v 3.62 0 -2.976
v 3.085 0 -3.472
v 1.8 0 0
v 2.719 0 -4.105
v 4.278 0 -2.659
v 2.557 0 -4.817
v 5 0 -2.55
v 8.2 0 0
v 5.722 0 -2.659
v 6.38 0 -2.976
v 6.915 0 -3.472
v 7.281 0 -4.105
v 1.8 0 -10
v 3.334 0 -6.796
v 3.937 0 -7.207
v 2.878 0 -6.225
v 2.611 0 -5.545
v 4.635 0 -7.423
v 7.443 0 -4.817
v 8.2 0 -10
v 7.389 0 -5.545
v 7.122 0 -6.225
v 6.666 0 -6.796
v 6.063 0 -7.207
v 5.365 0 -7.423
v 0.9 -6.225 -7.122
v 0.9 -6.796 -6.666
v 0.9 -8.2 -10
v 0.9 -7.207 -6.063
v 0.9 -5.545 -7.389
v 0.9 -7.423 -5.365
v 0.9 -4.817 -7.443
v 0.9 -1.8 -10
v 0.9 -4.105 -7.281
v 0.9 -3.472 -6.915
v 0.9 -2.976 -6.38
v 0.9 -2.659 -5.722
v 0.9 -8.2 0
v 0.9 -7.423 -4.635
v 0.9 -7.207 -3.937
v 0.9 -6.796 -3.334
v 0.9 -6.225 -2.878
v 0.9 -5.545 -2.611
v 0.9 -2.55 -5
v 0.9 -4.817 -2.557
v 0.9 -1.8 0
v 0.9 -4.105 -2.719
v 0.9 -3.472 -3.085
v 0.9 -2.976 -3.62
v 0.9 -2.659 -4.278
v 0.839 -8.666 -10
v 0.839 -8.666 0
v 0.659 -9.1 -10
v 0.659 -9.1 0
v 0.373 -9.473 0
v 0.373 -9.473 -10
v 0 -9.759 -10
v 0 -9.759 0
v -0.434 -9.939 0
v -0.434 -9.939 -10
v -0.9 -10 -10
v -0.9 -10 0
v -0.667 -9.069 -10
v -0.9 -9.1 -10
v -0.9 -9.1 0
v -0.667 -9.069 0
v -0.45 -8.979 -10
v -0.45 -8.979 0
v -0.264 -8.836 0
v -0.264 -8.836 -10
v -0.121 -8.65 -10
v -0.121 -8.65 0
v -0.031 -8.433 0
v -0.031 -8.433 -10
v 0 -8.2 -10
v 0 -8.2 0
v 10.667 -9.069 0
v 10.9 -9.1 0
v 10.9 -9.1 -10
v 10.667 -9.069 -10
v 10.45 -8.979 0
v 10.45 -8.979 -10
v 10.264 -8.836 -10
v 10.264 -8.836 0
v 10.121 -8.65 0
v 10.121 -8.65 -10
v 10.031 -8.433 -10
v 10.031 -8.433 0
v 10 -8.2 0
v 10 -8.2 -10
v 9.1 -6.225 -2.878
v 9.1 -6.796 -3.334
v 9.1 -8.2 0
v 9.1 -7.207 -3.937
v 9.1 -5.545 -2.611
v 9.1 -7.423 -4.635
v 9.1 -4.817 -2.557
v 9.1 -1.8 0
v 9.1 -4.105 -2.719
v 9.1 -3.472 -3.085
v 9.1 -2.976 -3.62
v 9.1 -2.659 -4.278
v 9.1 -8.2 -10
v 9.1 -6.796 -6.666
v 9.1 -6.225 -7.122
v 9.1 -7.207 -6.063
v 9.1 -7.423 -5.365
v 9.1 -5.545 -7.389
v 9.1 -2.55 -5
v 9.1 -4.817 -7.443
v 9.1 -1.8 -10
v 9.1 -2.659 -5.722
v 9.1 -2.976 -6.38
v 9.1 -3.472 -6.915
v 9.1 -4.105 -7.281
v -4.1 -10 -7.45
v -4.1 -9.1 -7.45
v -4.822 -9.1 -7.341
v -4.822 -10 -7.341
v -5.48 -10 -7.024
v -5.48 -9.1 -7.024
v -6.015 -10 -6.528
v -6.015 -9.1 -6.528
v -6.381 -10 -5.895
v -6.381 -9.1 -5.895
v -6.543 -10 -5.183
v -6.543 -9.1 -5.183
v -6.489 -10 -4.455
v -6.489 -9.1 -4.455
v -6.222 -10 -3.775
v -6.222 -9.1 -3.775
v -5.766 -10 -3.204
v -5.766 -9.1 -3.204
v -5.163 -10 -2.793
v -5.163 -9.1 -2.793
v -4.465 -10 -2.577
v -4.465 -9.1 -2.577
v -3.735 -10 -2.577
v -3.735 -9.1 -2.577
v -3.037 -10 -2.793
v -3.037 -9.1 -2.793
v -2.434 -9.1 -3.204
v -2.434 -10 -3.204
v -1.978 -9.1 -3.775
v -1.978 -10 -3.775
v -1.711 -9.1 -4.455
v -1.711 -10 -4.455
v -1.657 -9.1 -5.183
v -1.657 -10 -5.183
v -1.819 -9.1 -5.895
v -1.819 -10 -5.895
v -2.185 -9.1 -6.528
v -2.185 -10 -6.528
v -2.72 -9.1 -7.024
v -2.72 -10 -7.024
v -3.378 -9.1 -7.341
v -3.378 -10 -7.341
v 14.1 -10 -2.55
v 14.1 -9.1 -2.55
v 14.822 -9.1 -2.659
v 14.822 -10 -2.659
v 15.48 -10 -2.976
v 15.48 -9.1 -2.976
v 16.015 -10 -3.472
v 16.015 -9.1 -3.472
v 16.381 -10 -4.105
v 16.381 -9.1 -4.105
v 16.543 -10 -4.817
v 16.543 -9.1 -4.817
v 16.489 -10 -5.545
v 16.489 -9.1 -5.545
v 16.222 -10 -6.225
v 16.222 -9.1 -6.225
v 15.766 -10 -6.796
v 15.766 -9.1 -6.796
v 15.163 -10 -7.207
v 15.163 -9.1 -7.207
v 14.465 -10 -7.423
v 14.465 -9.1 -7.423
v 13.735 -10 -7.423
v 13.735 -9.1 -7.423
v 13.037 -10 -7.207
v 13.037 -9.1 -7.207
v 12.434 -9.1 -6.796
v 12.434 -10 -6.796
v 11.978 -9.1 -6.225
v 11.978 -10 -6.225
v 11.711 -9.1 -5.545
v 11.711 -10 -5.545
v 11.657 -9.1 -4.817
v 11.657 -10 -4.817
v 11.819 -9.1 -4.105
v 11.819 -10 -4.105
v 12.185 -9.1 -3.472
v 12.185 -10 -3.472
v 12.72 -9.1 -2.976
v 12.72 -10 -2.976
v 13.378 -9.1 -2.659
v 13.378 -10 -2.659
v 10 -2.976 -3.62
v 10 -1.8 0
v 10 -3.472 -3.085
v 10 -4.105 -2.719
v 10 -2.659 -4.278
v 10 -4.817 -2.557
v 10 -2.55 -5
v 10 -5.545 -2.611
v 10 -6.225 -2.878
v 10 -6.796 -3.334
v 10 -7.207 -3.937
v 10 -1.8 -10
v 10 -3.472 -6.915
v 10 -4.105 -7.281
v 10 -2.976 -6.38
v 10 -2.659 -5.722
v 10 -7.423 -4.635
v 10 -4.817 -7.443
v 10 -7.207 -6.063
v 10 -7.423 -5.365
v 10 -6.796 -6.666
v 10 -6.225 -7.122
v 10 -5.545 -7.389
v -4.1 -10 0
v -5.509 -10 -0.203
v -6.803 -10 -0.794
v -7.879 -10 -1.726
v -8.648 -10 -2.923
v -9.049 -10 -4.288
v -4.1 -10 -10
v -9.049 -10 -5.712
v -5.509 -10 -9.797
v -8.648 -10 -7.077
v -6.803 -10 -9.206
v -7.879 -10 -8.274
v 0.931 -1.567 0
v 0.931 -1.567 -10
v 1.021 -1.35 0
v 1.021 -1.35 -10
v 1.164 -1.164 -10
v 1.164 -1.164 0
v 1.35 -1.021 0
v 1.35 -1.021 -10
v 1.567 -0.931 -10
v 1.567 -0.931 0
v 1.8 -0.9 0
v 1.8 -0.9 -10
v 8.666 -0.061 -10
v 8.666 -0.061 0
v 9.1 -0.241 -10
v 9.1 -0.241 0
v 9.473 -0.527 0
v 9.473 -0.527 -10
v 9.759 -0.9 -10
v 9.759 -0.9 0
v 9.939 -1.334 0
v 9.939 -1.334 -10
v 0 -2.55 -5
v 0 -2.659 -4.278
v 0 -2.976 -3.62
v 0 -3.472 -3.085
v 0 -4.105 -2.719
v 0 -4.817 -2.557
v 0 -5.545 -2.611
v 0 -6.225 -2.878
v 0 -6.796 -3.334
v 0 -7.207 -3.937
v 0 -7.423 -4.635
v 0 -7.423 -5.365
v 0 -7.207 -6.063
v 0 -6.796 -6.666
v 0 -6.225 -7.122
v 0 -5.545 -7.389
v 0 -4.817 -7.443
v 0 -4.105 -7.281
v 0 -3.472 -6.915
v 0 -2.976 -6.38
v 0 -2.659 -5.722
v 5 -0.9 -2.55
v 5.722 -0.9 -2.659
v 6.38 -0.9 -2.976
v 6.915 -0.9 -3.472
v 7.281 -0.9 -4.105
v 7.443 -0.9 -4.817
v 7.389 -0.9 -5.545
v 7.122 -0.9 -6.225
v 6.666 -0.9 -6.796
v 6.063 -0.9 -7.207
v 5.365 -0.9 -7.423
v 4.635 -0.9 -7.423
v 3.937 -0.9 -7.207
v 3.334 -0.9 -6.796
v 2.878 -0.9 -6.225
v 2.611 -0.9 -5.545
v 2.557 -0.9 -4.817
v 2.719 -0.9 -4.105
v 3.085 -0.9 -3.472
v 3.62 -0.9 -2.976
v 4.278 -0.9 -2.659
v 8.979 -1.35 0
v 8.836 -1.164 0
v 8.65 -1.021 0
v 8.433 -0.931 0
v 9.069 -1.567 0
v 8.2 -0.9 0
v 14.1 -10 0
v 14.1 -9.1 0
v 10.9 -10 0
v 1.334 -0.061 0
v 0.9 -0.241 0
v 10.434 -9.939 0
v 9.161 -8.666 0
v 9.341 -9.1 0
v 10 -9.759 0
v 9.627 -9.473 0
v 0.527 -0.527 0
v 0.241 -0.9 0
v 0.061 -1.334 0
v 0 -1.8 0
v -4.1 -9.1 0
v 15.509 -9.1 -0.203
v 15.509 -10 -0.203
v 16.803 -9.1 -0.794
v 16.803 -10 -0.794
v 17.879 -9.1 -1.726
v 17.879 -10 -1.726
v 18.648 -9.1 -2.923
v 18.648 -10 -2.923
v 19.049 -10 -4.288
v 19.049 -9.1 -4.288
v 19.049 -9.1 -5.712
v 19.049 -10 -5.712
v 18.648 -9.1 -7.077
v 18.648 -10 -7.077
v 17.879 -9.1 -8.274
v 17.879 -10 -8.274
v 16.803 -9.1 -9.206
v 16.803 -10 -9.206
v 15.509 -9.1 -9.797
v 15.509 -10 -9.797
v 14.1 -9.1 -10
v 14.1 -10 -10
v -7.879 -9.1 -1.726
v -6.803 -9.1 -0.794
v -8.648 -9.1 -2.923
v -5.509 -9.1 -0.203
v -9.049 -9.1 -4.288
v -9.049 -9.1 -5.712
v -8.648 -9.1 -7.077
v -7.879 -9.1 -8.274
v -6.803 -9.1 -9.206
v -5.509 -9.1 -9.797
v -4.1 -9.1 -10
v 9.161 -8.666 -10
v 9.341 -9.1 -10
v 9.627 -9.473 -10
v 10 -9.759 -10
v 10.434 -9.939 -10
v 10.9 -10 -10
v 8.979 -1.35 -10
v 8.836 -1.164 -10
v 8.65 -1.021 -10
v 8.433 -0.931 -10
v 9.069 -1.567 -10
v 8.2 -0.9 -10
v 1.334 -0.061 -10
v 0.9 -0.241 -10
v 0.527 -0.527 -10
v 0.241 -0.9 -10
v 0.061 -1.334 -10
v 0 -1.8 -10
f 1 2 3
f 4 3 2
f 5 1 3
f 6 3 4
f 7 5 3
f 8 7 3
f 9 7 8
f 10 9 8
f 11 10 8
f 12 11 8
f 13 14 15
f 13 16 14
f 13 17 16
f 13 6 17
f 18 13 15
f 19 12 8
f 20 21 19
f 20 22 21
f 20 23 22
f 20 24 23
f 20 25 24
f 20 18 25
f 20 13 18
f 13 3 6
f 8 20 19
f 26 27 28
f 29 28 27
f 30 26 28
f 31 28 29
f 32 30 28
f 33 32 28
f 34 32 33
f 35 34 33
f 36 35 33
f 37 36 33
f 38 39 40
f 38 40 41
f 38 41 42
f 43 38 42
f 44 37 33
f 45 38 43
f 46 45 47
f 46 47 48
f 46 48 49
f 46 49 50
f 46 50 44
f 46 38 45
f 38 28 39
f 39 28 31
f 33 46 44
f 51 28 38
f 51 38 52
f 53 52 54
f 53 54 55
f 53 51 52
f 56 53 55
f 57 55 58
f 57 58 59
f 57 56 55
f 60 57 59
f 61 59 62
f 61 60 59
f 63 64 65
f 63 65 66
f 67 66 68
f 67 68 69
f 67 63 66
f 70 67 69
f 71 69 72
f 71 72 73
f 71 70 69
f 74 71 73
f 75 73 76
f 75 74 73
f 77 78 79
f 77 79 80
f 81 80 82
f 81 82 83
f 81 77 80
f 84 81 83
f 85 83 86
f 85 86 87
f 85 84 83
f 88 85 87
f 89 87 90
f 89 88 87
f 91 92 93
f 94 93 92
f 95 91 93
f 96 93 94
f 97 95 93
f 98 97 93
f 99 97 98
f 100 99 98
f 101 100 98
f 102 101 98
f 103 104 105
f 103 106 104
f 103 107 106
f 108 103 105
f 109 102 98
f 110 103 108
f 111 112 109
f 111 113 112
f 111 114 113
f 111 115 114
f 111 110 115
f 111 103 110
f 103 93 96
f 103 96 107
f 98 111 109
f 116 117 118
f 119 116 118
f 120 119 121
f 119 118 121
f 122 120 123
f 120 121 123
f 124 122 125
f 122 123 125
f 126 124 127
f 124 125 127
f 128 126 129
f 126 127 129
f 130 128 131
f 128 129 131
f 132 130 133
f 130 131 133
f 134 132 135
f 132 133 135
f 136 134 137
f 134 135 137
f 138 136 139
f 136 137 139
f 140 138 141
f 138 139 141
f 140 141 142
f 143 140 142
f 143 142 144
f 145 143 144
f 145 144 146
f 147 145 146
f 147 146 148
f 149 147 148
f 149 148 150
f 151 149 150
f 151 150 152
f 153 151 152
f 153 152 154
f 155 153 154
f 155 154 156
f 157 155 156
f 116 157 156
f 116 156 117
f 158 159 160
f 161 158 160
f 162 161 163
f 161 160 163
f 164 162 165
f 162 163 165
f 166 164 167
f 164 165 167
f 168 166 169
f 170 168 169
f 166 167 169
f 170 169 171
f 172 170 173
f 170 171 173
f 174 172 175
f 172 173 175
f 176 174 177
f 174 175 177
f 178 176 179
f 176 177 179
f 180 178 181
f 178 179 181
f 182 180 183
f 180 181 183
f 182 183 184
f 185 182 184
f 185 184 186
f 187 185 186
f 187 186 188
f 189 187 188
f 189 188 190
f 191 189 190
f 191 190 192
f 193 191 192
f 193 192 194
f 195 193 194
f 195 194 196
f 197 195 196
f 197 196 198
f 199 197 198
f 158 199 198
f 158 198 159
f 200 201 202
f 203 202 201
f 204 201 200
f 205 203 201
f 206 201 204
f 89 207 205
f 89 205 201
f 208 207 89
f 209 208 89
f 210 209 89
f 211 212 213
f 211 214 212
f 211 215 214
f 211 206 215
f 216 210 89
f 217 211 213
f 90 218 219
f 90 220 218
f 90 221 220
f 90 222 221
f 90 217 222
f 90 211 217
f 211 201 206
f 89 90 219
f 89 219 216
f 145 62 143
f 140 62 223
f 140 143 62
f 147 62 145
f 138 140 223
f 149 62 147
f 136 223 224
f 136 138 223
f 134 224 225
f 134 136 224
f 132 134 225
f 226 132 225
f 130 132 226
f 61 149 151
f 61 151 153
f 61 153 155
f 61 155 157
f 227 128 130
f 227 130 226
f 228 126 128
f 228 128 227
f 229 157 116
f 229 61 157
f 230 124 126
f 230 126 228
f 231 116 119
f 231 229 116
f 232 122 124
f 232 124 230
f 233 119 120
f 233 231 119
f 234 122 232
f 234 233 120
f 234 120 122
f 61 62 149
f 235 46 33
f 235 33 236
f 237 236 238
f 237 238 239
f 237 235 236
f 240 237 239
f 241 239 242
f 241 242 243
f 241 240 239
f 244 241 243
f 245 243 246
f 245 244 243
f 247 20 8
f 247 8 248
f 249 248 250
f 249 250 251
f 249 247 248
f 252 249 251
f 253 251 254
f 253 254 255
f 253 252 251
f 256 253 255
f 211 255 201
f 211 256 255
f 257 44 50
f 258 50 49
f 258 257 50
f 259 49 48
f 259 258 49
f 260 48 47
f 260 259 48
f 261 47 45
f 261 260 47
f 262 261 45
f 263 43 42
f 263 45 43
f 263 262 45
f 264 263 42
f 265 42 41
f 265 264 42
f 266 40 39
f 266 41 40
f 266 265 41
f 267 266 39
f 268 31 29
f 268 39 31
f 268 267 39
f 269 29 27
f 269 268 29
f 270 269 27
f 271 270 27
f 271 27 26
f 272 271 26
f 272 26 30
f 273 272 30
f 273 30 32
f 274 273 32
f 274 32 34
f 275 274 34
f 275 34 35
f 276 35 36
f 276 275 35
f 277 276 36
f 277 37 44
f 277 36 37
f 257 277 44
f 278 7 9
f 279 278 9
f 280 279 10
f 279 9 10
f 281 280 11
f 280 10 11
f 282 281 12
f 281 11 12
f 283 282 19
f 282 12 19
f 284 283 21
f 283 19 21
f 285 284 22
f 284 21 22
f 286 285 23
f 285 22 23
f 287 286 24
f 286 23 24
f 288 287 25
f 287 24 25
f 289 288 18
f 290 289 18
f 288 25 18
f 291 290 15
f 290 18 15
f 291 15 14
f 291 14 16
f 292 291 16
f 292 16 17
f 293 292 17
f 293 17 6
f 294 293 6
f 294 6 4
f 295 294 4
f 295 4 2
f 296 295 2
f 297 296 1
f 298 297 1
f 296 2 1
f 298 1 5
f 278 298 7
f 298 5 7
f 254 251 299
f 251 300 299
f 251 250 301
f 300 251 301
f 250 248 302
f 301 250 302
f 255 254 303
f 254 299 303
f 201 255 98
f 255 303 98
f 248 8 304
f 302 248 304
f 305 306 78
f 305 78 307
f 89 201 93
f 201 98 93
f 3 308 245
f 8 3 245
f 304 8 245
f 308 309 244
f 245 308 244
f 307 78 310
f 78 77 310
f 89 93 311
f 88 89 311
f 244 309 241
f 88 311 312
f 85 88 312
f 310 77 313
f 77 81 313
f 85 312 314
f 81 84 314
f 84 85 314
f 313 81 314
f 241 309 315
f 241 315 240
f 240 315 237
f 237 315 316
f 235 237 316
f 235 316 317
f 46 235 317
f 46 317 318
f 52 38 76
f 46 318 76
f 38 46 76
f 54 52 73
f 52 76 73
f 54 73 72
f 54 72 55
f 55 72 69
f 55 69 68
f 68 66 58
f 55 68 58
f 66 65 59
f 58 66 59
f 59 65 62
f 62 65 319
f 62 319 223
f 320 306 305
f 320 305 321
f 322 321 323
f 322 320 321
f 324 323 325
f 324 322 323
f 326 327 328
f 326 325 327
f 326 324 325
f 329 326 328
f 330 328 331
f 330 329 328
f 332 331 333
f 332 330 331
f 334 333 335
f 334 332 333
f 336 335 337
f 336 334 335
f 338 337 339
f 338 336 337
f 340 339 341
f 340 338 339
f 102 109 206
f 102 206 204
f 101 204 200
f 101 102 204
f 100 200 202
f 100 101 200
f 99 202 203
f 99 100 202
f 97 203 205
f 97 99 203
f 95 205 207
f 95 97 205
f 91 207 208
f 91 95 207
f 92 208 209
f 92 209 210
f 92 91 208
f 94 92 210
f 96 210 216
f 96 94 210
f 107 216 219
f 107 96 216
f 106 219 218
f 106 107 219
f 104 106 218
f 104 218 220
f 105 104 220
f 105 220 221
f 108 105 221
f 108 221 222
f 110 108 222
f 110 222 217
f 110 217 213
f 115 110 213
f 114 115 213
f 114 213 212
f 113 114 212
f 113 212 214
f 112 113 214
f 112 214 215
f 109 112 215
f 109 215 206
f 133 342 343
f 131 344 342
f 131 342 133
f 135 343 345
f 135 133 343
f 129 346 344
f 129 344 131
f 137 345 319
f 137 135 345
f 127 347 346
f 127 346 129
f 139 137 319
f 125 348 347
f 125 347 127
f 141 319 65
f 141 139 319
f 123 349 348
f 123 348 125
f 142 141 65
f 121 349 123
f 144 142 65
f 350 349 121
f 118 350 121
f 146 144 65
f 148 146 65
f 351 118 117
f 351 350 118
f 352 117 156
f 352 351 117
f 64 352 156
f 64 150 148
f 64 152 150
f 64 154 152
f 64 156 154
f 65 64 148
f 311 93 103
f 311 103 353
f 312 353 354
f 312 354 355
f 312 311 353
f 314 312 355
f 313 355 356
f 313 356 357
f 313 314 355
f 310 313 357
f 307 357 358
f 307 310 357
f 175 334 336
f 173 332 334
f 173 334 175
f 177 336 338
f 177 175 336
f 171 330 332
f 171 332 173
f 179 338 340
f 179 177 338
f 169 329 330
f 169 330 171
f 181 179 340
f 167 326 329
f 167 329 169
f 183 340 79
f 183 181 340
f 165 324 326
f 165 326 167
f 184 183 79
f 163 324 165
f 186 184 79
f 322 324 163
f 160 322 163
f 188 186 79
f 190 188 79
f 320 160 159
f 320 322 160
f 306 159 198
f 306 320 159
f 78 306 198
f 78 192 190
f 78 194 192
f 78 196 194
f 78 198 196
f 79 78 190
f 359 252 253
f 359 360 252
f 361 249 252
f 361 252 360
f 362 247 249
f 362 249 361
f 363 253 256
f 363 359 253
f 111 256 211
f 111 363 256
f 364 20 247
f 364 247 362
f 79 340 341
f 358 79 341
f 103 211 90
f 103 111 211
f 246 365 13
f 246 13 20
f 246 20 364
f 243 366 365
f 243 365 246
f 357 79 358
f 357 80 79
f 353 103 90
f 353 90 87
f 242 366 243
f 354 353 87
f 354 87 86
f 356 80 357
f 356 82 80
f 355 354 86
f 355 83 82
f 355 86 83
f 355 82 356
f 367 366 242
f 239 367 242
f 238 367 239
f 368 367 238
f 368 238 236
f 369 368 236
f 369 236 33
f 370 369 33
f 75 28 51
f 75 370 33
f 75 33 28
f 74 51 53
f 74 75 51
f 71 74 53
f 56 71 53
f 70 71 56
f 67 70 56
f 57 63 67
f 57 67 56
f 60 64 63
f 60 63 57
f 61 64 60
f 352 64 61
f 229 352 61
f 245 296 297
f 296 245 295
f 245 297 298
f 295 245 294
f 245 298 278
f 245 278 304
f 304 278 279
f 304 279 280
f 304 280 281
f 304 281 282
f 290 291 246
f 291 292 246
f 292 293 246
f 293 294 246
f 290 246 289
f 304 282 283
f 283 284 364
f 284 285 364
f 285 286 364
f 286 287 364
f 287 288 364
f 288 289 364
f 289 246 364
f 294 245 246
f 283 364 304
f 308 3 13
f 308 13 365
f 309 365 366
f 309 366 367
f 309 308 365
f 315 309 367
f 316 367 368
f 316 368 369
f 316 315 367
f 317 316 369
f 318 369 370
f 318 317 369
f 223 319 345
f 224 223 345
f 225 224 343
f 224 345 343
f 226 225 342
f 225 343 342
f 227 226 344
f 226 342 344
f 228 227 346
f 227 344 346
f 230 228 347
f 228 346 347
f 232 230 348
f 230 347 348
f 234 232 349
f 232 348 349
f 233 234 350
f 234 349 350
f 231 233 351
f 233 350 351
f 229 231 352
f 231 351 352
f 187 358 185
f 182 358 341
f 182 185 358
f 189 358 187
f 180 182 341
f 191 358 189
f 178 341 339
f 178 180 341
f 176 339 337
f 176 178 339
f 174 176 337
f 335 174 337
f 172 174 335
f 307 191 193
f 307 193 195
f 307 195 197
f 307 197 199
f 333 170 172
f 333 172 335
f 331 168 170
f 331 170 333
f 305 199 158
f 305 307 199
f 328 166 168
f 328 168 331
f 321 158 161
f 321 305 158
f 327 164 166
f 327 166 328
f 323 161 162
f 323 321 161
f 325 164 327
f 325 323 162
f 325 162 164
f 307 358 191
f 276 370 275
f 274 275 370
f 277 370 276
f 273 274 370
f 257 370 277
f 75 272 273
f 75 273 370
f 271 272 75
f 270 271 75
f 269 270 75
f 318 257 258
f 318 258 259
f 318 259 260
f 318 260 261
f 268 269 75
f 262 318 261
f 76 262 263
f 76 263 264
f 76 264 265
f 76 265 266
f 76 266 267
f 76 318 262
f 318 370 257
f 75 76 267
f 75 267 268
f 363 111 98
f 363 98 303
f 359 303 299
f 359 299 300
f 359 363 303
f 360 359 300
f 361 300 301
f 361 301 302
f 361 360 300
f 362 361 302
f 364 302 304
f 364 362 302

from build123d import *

# Parameters (mm, degrees)
SKETCH1_W                      = 10
SKETCH1_H                      = 10
SKETCH1_R                      = 2.45
BASE_FLANGE1_DEPTH             = 0.9
EDGE_FLANGE1_STRIP_W           = 5.4
EDGE_FLANGE1_STRIP_H           = 0.9
EDGE_FLANGE1_STRIP_CUT_DEPTH   = 10
EDGE_FLANGE1_STRIP_2_W         = 5.4
EDGE_FLANGE1_STRIP_2_H         = 0.9
EDGE_FLANGE1_STRIP_CUT_2_DEPTH = 10
EDGE_FLANGE1_DEPTH             = 10
EDGE_FLANGE1_BEND_DEPTH        = 10
EDGE_FLANGE2_STRIP_W           = 5.4
EDGE_FLANGE2_STRIP_H           = 0.9
EDGE_FLANGE2_STRIP_CUT_DEPTH   = 10
EDGE_FLANGE2_STRIP_2_W         = 5.4
EDGE_FLANGE2_STRIP_2_H         = 0.9
EDGE_FLANGE2_STRIP_CUT_2_DEPTH = 10
EDGE_FLANGE2_DEPTH             = 10
EDGE_FLANGE2_BEND_DEPTH        = 10
HOLE1_OUTLINE_R                = 2.45
HOLE1_DEPTH                    = 10
SKETCH21_R                     = 2.45
CUT_EXTRUDE1_DEPTH             = 10


# Read off the part's stored shape, not the designer's step: Hole1
# Sheet-metal steps are written as plain solids
with BuildPart() as part:
    # Sketch1 → Base-Flange1 (new body)
    with BuildSketch(Plane(origin=(0, 0, 0), x_dir=(1, 0, 0), z_dir=(0, 1, 0))):
        with Locations((5, 5)):
            Rectangle(SKETCH1_W, SKETCH1_H)
        with Locations(Location((5, 5, 0), (0, 0, 270))):
            Circle(SKETCH1_R, mode=Mode.SUBTRACT)
    extrude(amount=-BASE_FLANGE1_DEPTH)

    # Edge-Flange1 strip (across the edge) → Edge-Flange1 strip cut (cut)
    with BuildSketch(Plane(origin=(10, -0.9, -10), x_dir=(-1, 0, 0), z_dir=(0, 0, 1))):
        with Locations((-0.9, -0.45)):
            Rectangle(EDGE_FLANGE1_STRIP_W, EDGE_FLANGE1_STRIP_H)
    extrude(amount=EDGE_FLANGE1_STRIP_CUT_DEPTH, mode=Mode.SUBTRACT)

    # Edge-Flange1 strip 2 (across the edge) → Edge-Flange1 strip cut 2 (cut)
    with BuildSketch(Plane(origin=(0, -0.9, 0), x_dir=(1, 0, 0), z_dir=(0, 0, -1))):
        with Locations((-0.9, -0.45)):
            Rectangle(EDGE_FLANGE1_STRIP_2_W, EDGE_FLANGE1_STRIP_2_H)
    extrude(amount=EDGE_FLANGE1_STRIP_CUT_2_DEPTH, mode=Mode.SUBTRACT)

    # Edge-Flange1 section (across the edge) → Edge-Flange1 (add)
    with BuildSketch(Plane(origin=(10, -0.9, -10), x_dir=(-1, 0, 0), z_dir=(0, 0, 1))):
        with BuildLine():
            Line((0, 0.9), (0, 9.1))
            Line((0, 9.1), (0.9, 9.1))
            Line((0.9, 9.1), (0.9, 0.9))
            ThreePointArc((0.9, 0.9), (1.163603897, 0.263603897), (1.8, 0))
            Line((1.8, 0), (1.8, -0.9))
            ThreePointArc((1.8, -0.9), (0.527207794, -0.372792206), (0, 0.9))
        make_face()
    extrude(amount=EDGE_FLANGE1_DEPTH)

    # Edge-Flange1 section 2 (across the edge) → Edge-Flange1 bend (add)
    with BuildSketch(Plane(origin=(0, -0.9, 0), x_dir=(1, 0, 0), z_dir=(0, 0, -1))):
        with BuildLine():
            Line((0, 0.9), (0, 9.1))
            Line((0, 9.1), (0.9, 9.1))
            Line((0.9, 9.1), (0.9, 0.9))
            ThreePointArc((0.9, 0.9), (1.163603897, 0.263603897), (1.8, 0))
            Line((1.8, 0), (1.8, -0.9))
            ThreePointArc((1.8, -0.9), (0.527207794, -0.372792206), (0, 0.9))
        make_face()
    extrude(amount=EDGE_FLANGE1_BEND_DEPTH)

    # Edge-Flange2 strip (across the edge) → Edge-Flange2 strip cut (cut)
    with BuildSketch(Plane(origin=(10, -10, 0), x_dir=(0, 1, 0), z_dir=(0, 0, -1))):
        with Locations((-0.9, -0.45)):
            Rectangle(EDGE_FLANGE2_STRIP_W, EDGE_FLANGE2_STRIP_H)
    extrude(amount=EDGE_FLANGE2_STRIP_CUT_DEPTH, mode=Mode.SUBTRACT)

    # Edge-Flange2 strip 2 (across the edge) → Edge-Flange2 strip cut 2 (cut)
    with BuildSketch(Plane(origin=(0, -10, -10), x_dir=(0, 1, 0), z_dir=(0, 0, 1))):
        with Locations((-0.9, -0.45)):
            Rectangle(EDGE_FLANGE2_STRIP_2_W, EDGE_FLANGE2_STRIP_2_H)
    extrude(amount=EDGE_FLANGE2_STRIP_CUT_2_DEPTH, mode=Mode.SUBTRACT)

    # Edge-Flange2 section (across the edge) → Edge-Flange2 (add)
    with BuildSketch(Plane(origin=(10, -10, 0), x_dir=(0, 1, 0), z_dir=(0, 0, -1))):
        with BuildLine():
            Line((0, 0.9), (0, 9.1))
            Line((0, 9.1), (0.9, 9.1))
            Line((0.9, 9.1), (0.9, 0.9))
            ThreePointArc((0.9, 0.9), (1.163603897, 0.263603897), (1.8, 0))
            Line((1.8, 0), (1.8, -0.9))
            ThreePointArc((1.8, -0.9), (0.527207794, -0.372792206), (0, 0.9))
        make_face()
    extrude(amount=EDGE_FLANGE2_DEPTH)

    # Edge-Flange2 section 2 (across the edge) → Edge-Flange2 bend (add)
    with BuildSketch(Plane(origin=(0, -10, -10), x_dir=(0, 1, 0), z_dir=(0, 0, 1))):
        with BuildLine():
            Line((0, 0.9), (0, 9.1))
            Line((0, 9.1), (0.9, 9.1))
            Line((0.9, 9.1), (0.9, 0.9))
            ThreePointArc((0.9, 0.9), (1.163603897, 0.263603897), (1.8, 0))
            Line((1.8, 0), (1.8, -0.9))
            ThreePointArc((1.8, -0.9), (0.527207794, -0.372792206), (0, 0.9))
        make_face()
    extrude(amount=EDGE_FLANGE2_BEND_DEPTH)

    # Hole1 outline → Hole1 (cut)
    with BuildSketch(Plane.YZ):
        with Locations((-5, -5)):
            Circle(HOLE1_OUTLINE_R)
    extrude(amount=HOLE1_DEPTH, mode=Mode.SUBTRACT)

    # Sketch21 → Cut-Extrude1 (cut)
    with BuildSketch(Plane(origin=(0, -9.1, 0), x_dir=(1, 0, 0), z_dir=(0, 1, 0))):
        with Locations(Location((14.1, 5, 0), (0, 0, 270))):
            Circle(SKETCH21_R)
        with Locations(Location((-4.1, 5, 0), (0, 0, 90))):
            Circle(SKETCH21_R)
        with BuildLine():
            Line((-4.1, 10), (-4.552354971, 12.340568082))
            Line((-4.552354971, 12.340568082), (-11.187715638, 12.084129022))
            Line((-11.187715638, 12.084129022), (-11.412099815, 3.1728717))
            Line((-11.412099815, 3.1728717), (-10.931276579, -1.41097649))
            Line((-10.931276579, -1.41097649), (-3.526598732, -3.206049908))
            Line((-3.526598732, -3.206049908), (-4.1, 0))
            ThreePointArc((-4.1, 0), (-9.1, 5), (-4.1, 10))
        make_face()
        with BuildLine():
            Line((14.1, 10), (20.065794752, 12.917555966))
            Line((20.065794752, 12.917555966), (23.30333788, -2.532897376))
            Line((23.30333788, -2.532897376), (14.680574501, -2.532897376))
            Line((14.680574501, -2.532897376), (14.1, 0))
            ThreePointArc((14.1, 0), (19.1, 5), (14.1, 10))
        make_face()
    extrude(amount=-CUT_EXTRUDE1_DEPTH, mode=Mode.SUBTRACT)


solid = part.part
